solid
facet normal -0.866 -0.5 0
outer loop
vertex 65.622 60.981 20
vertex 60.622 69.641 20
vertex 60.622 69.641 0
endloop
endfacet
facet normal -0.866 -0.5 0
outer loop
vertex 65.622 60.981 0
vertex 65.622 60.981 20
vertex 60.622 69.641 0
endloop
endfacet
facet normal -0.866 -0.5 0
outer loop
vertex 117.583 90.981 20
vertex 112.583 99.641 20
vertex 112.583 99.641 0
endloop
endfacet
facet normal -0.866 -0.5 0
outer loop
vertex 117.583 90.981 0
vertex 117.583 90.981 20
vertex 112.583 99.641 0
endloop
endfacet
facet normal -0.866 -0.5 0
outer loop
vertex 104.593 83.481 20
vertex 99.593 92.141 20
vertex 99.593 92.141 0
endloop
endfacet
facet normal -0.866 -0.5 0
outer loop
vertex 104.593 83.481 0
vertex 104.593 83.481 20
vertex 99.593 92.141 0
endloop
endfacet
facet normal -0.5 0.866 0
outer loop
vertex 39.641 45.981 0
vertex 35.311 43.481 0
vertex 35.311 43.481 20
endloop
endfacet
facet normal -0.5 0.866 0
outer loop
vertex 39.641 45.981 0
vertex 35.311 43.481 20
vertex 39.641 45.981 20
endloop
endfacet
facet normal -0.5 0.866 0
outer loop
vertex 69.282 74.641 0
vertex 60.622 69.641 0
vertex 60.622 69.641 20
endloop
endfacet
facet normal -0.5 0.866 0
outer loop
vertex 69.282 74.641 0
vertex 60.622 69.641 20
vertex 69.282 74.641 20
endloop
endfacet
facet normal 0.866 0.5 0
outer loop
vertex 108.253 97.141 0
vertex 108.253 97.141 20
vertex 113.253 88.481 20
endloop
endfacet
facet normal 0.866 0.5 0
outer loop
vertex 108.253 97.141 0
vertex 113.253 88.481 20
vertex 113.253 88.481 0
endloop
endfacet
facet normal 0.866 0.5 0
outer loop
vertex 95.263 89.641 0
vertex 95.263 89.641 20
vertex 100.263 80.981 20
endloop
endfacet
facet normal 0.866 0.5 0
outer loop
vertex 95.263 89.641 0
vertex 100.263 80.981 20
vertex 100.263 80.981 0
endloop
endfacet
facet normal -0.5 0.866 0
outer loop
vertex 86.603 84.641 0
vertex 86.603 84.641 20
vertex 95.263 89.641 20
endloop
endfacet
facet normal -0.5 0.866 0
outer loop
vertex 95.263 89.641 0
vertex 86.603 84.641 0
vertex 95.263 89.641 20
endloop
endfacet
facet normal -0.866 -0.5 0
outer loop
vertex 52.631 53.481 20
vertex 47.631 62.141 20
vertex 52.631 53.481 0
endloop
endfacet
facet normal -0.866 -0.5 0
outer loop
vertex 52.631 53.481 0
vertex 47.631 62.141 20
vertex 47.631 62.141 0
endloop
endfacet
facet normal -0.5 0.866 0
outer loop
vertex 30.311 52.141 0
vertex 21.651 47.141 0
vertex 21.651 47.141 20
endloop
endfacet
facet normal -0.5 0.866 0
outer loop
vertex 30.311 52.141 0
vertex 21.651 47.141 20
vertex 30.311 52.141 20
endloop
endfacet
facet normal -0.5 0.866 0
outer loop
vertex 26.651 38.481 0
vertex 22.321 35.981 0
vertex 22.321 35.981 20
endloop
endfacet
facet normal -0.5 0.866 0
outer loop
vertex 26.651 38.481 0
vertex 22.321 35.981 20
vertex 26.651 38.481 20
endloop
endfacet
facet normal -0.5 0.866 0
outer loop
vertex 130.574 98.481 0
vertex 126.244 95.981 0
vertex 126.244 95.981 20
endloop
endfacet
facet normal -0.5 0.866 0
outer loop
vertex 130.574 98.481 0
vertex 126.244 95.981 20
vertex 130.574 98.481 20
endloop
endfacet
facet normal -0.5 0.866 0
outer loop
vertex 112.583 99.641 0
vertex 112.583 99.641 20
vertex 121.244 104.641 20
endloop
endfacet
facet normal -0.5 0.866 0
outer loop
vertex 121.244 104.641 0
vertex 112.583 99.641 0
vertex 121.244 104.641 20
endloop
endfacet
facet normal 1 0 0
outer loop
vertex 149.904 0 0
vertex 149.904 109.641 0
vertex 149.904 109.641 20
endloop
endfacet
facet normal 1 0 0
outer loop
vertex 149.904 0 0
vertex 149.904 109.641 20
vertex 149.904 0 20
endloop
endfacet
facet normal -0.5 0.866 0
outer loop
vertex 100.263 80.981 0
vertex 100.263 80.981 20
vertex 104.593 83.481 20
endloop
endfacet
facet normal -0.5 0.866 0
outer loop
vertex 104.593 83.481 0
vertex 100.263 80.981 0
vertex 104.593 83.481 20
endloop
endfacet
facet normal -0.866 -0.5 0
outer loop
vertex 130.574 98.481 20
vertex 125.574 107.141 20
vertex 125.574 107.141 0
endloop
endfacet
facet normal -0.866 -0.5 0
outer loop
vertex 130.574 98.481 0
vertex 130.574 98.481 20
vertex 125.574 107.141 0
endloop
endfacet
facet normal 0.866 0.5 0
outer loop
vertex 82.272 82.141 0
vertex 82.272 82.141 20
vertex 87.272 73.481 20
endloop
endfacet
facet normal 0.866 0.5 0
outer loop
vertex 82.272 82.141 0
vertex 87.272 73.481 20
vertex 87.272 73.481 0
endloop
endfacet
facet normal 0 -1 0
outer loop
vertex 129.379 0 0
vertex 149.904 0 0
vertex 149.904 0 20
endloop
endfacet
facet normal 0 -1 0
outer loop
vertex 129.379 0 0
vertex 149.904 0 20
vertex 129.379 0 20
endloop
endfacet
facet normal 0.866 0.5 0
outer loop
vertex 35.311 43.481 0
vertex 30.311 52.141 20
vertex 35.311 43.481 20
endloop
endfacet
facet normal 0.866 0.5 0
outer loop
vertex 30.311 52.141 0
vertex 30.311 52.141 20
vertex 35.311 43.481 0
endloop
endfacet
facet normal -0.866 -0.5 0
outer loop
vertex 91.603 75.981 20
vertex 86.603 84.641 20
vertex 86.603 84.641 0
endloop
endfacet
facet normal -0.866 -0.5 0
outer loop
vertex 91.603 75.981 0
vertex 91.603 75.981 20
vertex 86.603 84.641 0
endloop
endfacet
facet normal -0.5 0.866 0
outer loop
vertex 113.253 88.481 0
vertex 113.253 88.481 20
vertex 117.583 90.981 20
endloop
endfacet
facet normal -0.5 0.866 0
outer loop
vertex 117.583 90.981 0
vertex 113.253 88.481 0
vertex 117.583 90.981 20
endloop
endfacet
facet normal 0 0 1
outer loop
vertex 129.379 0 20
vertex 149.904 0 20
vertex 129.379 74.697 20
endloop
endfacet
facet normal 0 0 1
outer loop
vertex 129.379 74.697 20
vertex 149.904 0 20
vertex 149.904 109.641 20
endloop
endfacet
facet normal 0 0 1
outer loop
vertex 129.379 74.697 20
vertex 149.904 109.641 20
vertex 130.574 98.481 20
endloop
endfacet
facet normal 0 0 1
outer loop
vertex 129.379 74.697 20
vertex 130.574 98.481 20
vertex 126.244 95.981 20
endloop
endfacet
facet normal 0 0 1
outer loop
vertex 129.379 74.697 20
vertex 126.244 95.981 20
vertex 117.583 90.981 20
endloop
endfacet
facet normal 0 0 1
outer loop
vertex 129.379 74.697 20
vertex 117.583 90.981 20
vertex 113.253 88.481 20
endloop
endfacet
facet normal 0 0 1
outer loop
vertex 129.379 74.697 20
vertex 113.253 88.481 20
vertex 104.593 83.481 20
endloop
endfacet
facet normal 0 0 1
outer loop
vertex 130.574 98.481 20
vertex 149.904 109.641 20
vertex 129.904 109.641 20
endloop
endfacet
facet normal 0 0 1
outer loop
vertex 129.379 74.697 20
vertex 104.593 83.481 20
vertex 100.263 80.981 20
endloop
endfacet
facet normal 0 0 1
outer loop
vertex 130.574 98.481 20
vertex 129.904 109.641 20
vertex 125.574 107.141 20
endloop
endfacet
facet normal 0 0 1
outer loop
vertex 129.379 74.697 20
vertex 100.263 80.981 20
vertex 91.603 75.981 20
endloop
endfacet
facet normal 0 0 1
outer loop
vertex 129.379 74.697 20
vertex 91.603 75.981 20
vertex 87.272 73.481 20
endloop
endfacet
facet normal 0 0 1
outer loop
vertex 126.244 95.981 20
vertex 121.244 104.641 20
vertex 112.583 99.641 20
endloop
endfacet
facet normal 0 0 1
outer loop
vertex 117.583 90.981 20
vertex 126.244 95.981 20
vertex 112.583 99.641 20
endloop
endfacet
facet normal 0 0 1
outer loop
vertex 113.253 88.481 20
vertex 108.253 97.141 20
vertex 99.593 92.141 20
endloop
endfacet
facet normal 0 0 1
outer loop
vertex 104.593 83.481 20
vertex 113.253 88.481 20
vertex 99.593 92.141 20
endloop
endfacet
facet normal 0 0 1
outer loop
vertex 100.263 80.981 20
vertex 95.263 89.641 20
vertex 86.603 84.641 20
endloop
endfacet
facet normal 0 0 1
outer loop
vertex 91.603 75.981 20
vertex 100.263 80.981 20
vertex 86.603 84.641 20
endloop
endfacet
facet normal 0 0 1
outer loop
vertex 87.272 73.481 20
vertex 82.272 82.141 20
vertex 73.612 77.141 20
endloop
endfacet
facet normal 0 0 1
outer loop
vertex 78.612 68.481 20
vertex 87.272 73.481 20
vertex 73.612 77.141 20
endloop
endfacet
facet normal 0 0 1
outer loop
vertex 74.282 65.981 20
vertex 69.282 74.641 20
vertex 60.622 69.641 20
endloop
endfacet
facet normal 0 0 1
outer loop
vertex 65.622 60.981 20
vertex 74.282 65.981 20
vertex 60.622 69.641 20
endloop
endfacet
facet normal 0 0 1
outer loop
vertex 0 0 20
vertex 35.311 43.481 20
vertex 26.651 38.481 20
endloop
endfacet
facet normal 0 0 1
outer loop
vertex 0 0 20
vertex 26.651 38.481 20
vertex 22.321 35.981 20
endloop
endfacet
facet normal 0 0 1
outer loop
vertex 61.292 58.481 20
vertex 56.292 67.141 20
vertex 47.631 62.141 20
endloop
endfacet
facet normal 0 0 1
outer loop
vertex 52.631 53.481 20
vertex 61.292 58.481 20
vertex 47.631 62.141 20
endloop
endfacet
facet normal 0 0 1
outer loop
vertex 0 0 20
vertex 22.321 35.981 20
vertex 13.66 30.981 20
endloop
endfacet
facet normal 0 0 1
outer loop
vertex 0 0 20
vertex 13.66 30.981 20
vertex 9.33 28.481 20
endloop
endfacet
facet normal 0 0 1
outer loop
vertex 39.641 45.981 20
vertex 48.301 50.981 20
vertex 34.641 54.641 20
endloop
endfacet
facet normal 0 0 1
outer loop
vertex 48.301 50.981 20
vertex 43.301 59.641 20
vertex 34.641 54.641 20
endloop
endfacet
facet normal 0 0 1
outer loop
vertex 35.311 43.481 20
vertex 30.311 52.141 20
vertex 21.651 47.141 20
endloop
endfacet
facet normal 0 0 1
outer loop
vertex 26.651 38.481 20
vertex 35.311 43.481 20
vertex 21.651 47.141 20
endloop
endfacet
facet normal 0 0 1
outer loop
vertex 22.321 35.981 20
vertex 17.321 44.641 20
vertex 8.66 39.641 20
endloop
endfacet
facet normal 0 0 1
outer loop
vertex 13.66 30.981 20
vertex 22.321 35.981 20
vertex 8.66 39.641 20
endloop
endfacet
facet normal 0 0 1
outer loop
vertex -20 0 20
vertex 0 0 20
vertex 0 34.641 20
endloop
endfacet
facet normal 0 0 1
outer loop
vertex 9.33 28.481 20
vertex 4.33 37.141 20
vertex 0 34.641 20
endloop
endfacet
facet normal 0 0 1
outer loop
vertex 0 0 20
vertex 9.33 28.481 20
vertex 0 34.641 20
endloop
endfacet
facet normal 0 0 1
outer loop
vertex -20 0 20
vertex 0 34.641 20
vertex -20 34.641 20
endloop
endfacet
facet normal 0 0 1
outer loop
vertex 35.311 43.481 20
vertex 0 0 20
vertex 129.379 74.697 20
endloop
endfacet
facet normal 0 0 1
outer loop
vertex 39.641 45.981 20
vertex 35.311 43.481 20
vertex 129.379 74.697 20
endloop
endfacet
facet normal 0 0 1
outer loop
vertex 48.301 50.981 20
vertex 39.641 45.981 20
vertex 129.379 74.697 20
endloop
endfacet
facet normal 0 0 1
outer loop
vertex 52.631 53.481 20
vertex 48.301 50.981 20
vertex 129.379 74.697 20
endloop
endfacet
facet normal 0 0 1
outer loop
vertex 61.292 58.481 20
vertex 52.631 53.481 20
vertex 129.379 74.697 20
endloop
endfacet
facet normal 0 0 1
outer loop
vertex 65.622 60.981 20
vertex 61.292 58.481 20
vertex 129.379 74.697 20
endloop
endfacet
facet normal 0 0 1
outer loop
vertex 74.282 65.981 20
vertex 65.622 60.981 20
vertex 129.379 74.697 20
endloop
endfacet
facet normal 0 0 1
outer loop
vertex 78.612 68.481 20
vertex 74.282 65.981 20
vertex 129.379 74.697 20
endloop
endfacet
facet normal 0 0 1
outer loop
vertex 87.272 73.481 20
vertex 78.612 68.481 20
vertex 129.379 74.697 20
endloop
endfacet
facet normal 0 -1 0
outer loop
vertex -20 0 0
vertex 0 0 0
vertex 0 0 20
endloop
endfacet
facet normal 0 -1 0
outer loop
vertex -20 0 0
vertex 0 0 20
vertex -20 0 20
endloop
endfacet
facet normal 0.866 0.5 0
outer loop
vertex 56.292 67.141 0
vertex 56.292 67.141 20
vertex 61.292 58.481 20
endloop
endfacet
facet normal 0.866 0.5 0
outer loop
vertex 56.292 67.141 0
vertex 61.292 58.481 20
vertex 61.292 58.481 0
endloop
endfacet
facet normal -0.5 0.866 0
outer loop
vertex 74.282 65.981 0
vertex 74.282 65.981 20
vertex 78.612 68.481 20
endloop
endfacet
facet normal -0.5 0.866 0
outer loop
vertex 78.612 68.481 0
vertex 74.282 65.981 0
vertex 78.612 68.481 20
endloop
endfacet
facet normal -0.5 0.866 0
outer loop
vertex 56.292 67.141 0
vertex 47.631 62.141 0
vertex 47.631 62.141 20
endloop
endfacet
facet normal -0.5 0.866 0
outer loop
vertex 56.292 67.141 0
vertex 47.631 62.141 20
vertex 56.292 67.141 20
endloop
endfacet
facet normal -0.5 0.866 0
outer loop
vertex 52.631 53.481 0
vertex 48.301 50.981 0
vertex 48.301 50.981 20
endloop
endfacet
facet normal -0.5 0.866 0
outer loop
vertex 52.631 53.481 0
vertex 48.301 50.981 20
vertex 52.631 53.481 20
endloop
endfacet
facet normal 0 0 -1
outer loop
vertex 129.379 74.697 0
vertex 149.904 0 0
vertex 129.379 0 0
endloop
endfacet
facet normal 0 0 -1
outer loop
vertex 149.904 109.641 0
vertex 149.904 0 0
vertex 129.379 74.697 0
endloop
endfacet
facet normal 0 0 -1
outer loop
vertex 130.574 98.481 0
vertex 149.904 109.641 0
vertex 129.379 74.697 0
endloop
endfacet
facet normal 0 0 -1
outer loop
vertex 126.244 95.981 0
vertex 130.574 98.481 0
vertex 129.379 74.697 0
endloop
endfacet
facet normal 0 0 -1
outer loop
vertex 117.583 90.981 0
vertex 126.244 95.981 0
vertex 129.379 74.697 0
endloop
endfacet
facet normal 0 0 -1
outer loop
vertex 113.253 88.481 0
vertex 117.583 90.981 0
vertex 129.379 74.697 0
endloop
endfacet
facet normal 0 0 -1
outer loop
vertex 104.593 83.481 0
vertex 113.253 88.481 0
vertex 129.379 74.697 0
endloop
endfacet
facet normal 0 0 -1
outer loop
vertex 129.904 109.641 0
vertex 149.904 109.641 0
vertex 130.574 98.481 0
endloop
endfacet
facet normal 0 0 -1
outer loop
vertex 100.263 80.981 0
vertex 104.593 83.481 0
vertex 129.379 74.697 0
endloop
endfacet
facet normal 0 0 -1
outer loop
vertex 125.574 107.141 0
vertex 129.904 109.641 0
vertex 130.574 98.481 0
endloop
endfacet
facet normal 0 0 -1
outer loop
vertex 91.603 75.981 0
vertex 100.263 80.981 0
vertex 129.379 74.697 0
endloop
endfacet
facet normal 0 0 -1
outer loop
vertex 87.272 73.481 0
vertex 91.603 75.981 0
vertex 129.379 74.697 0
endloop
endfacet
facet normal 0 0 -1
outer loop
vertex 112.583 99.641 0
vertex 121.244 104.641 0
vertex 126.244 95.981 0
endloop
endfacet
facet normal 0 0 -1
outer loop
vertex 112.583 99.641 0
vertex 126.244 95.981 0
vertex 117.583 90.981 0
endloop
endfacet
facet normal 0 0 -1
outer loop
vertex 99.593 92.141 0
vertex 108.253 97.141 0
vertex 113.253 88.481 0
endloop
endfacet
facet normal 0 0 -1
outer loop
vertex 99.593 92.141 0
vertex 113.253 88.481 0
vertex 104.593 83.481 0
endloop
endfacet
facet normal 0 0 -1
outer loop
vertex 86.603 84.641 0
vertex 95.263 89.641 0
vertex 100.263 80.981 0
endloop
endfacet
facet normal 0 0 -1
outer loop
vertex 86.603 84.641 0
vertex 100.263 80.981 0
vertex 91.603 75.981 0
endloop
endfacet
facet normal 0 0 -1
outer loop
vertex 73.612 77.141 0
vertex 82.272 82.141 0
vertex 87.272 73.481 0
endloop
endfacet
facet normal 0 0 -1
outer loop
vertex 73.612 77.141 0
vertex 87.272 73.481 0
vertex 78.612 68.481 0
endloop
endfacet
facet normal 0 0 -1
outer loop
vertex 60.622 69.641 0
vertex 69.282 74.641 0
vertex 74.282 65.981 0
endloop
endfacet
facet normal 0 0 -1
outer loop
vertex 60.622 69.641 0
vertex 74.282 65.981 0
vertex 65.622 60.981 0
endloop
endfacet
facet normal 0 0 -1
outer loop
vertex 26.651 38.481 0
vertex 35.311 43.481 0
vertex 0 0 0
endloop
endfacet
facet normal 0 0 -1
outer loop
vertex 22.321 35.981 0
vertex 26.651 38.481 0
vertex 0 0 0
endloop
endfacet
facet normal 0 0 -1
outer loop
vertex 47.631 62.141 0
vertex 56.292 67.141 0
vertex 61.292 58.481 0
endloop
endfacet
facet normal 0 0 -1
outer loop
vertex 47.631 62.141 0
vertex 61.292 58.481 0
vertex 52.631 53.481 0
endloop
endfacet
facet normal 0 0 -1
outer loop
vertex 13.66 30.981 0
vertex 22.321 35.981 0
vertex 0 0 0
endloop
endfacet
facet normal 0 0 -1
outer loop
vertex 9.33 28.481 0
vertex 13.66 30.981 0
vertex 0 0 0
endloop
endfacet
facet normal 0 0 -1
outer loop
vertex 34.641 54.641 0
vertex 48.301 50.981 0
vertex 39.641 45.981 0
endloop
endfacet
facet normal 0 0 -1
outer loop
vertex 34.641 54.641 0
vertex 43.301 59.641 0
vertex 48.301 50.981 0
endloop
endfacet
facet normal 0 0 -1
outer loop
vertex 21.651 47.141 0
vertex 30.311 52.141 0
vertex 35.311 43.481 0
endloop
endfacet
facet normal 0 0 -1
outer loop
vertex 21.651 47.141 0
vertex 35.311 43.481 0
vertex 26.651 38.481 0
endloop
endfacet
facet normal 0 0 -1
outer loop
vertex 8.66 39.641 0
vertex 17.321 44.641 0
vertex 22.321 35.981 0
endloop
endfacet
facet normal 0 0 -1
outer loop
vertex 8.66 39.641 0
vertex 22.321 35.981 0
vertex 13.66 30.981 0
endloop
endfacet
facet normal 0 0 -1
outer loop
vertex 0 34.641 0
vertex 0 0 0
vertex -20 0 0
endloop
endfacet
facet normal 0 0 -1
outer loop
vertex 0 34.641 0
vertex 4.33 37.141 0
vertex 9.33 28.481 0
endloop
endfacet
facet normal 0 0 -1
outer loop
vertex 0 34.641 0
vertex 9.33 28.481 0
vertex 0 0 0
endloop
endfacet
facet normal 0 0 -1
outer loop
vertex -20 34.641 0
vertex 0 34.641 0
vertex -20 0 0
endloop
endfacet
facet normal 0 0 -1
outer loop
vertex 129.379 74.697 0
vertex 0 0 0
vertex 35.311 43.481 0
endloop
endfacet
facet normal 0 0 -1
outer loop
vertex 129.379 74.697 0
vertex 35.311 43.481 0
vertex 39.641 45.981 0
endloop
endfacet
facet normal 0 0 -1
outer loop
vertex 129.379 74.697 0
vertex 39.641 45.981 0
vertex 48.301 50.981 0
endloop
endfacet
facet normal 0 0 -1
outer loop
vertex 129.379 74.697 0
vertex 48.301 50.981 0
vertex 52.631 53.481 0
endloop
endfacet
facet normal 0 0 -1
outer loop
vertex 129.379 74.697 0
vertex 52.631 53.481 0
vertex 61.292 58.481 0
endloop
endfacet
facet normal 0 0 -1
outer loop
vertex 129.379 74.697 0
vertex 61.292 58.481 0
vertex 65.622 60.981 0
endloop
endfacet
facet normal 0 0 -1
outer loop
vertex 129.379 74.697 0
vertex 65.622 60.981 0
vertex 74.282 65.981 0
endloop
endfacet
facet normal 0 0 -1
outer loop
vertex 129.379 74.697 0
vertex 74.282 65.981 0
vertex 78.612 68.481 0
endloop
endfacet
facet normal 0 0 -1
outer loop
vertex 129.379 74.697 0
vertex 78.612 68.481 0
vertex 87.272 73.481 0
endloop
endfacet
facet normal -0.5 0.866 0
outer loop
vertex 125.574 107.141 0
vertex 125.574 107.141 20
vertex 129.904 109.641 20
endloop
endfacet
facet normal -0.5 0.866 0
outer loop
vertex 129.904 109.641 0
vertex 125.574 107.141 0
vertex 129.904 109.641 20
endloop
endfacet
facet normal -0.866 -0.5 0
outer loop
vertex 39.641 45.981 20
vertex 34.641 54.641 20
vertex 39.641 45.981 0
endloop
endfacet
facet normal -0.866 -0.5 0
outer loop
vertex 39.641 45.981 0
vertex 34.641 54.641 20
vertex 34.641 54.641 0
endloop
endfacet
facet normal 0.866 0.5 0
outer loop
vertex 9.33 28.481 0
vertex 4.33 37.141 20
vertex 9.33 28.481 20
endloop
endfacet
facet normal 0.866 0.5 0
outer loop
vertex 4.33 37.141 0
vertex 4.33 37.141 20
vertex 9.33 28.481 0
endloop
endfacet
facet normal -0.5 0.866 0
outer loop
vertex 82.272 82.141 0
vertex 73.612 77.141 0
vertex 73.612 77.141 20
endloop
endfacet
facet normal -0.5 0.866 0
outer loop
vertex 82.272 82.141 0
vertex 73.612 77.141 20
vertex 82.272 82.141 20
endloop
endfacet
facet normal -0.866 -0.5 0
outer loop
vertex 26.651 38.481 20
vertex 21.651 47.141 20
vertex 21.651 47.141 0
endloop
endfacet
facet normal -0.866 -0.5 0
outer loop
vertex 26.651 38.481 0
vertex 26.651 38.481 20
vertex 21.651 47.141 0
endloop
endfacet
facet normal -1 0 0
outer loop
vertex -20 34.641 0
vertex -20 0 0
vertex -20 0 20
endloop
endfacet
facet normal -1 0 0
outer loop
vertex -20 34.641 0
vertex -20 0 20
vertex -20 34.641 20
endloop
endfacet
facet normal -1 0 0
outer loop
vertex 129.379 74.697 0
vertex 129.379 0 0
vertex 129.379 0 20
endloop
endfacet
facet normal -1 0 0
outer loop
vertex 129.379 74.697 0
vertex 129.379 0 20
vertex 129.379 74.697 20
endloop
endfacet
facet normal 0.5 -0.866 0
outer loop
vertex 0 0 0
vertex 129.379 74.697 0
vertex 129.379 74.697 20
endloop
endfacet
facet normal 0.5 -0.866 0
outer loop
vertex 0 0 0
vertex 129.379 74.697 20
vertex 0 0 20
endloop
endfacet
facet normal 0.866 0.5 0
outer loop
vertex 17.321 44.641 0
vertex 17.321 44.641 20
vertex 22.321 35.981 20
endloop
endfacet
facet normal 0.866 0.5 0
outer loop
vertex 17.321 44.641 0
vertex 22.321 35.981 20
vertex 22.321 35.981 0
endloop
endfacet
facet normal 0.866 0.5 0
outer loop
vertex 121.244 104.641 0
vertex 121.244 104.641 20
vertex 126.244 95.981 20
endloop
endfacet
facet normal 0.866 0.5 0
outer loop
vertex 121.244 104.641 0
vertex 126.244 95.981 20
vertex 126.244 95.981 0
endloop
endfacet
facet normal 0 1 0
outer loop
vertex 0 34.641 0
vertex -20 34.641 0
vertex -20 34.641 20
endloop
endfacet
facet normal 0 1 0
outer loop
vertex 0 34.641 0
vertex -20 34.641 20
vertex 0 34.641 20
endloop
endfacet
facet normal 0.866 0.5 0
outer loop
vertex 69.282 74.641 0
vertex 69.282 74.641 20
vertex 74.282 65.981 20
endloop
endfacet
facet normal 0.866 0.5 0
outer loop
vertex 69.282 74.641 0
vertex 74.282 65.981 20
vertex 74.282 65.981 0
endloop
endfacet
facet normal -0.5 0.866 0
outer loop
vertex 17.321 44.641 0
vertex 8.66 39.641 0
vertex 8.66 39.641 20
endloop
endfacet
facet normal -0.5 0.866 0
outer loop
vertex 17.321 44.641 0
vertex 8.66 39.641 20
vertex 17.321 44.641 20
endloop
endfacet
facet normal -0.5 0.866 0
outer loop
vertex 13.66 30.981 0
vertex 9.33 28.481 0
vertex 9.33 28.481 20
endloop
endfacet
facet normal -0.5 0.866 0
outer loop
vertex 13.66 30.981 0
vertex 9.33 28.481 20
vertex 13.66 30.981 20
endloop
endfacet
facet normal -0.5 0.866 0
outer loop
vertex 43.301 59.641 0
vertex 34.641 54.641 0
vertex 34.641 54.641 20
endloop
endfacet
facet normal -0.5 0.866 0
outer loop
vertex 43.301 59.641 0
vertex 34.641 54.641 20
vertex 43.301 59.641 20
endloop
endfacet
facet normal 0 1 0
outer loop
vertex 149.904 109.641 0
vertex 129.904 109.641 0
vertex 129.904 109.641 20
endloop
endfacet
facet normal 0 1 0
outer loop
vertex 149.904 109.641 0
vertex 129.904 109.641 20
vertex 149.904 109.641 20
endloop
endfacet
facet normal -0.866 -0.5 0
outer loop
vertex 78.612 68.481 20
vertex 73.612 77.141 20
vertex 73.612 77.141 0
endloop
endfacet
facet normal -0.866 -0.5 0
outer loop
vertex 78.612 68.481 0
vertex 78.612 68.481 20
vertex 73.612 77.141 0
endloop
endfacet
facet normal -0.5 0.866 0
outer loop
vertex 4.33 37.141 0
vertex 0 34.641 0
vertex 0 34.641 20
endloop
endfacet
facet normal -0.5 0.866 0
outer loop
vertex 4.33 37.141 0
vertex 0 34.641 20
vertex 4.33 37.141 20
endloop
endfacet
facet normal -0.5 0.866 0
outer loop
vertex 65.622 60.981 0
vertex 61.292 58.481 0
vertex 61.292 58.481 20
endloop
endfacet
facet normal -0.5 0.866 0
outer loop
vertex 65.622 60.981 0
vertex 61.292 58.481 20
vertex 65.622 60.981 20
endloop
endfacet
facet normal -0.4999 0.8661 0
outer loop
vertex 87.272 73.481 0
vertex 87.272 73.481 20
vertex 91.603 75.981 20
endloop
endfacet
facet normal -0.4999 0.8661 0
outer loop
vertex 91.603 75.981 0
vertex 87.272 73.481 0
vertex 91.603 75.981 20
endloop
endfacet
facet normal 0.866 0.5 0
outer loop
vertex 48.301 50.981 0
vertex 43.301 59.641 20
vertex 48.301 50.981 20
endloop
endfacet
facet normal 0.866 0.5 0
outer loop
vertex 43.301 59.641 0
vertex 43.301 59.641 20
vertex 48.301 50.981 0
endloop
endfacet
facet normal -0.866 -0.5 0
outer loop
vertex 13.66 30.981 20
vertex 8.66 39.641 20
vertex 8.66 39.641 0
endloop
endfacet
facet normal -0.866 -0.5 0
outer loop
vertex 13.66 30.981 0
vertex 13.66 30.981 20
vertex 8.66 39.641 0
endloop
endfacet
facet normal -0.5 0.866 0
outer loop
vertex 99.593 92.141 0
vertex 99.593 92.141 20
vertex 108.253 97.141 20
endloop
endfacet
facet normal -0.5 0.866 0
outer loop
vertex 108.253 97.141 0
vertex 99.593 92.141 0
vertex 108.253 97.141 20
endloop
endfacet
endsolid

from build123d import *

# Parameters (mm, degrees)
BOSS_EXTRU_2_DEPTH      = 20
ESQUISSE4_W             = 5
ESQUISSE4_H             = 20
ENL_V_MAT_EXTRU_1_DEPTH = 10


with BuildPart() as part:
    # Esquisse2 → Boss.-Extru.2 (new body)
    with BuildSketch(Plane.XY):
        Polygon((0, 0), (-20, 0), (-20, 34.641016151), (0, 34.641016151), (129.903810568, 109.641016151), (149.903810568, 109.641016151), (149.903810568, 0), (129.37876344, 0), (129.37876344, 74.696863899), align=None)
    extrude(amount=BOSS_EXTRU_2_DEPTH)

    # Esquisse4 → Enlèv. mat.-Extru.1 (cut)
    with BuildSketch(Plane(origin=(-15, 25.980762114, 0), x_dir=(0.8660254037844379, 0.5000000000000013, 0), z_dir=(-0.5000000000000013, 0.8660254037844379, 0))):
        with Locations((24.820508076, -10)):
            Rectangle(ESQUISSE4_W, ESQUISSE4_H)
        with Locations((39.820508076, -10)):
            Rectangle(ESQUISSE4_W, ESQUISSE4_H)
        with Locations((54.820508076, -10)):
            Rectangle(ESQUISSE4_W, ESQUISSE4_H)
        with Locations((69.820508076, -10)):
            Rectangle(ESQUISSE4_W, ESQUISSE4_H)
        with Locations((84.820508076, -10)):
            Rectangle(ESQUISSE4_W, ESQUISSE4_H)
        with Locations((99.820508076, -10)):
            Rectangle(ESQUISSE4_W, ESQUISSE4_H)
        with Locations((114.820508076, -10)):
            Rectangle(ESQUISSE4_W, ESQUISSE4_H)
        with Locations((129.820508076, -10)):
            Rectangle(ESQUISSE4_W, ESQUISSE4_H)
        with Locations((144.820508076, -10)):
            Rectangle(ESQUISSE4_W, ESQUISSE4_H)
        with Locations((159.820508076, -10)):
            Rectangle(ESQUISSE4_W, ESQUISSE4_H)
    extrude(amount=-ENL_V_MAT_EXTRU_1_DEPTH, mode=Mode.SUBTRACT)


solid = part.part
